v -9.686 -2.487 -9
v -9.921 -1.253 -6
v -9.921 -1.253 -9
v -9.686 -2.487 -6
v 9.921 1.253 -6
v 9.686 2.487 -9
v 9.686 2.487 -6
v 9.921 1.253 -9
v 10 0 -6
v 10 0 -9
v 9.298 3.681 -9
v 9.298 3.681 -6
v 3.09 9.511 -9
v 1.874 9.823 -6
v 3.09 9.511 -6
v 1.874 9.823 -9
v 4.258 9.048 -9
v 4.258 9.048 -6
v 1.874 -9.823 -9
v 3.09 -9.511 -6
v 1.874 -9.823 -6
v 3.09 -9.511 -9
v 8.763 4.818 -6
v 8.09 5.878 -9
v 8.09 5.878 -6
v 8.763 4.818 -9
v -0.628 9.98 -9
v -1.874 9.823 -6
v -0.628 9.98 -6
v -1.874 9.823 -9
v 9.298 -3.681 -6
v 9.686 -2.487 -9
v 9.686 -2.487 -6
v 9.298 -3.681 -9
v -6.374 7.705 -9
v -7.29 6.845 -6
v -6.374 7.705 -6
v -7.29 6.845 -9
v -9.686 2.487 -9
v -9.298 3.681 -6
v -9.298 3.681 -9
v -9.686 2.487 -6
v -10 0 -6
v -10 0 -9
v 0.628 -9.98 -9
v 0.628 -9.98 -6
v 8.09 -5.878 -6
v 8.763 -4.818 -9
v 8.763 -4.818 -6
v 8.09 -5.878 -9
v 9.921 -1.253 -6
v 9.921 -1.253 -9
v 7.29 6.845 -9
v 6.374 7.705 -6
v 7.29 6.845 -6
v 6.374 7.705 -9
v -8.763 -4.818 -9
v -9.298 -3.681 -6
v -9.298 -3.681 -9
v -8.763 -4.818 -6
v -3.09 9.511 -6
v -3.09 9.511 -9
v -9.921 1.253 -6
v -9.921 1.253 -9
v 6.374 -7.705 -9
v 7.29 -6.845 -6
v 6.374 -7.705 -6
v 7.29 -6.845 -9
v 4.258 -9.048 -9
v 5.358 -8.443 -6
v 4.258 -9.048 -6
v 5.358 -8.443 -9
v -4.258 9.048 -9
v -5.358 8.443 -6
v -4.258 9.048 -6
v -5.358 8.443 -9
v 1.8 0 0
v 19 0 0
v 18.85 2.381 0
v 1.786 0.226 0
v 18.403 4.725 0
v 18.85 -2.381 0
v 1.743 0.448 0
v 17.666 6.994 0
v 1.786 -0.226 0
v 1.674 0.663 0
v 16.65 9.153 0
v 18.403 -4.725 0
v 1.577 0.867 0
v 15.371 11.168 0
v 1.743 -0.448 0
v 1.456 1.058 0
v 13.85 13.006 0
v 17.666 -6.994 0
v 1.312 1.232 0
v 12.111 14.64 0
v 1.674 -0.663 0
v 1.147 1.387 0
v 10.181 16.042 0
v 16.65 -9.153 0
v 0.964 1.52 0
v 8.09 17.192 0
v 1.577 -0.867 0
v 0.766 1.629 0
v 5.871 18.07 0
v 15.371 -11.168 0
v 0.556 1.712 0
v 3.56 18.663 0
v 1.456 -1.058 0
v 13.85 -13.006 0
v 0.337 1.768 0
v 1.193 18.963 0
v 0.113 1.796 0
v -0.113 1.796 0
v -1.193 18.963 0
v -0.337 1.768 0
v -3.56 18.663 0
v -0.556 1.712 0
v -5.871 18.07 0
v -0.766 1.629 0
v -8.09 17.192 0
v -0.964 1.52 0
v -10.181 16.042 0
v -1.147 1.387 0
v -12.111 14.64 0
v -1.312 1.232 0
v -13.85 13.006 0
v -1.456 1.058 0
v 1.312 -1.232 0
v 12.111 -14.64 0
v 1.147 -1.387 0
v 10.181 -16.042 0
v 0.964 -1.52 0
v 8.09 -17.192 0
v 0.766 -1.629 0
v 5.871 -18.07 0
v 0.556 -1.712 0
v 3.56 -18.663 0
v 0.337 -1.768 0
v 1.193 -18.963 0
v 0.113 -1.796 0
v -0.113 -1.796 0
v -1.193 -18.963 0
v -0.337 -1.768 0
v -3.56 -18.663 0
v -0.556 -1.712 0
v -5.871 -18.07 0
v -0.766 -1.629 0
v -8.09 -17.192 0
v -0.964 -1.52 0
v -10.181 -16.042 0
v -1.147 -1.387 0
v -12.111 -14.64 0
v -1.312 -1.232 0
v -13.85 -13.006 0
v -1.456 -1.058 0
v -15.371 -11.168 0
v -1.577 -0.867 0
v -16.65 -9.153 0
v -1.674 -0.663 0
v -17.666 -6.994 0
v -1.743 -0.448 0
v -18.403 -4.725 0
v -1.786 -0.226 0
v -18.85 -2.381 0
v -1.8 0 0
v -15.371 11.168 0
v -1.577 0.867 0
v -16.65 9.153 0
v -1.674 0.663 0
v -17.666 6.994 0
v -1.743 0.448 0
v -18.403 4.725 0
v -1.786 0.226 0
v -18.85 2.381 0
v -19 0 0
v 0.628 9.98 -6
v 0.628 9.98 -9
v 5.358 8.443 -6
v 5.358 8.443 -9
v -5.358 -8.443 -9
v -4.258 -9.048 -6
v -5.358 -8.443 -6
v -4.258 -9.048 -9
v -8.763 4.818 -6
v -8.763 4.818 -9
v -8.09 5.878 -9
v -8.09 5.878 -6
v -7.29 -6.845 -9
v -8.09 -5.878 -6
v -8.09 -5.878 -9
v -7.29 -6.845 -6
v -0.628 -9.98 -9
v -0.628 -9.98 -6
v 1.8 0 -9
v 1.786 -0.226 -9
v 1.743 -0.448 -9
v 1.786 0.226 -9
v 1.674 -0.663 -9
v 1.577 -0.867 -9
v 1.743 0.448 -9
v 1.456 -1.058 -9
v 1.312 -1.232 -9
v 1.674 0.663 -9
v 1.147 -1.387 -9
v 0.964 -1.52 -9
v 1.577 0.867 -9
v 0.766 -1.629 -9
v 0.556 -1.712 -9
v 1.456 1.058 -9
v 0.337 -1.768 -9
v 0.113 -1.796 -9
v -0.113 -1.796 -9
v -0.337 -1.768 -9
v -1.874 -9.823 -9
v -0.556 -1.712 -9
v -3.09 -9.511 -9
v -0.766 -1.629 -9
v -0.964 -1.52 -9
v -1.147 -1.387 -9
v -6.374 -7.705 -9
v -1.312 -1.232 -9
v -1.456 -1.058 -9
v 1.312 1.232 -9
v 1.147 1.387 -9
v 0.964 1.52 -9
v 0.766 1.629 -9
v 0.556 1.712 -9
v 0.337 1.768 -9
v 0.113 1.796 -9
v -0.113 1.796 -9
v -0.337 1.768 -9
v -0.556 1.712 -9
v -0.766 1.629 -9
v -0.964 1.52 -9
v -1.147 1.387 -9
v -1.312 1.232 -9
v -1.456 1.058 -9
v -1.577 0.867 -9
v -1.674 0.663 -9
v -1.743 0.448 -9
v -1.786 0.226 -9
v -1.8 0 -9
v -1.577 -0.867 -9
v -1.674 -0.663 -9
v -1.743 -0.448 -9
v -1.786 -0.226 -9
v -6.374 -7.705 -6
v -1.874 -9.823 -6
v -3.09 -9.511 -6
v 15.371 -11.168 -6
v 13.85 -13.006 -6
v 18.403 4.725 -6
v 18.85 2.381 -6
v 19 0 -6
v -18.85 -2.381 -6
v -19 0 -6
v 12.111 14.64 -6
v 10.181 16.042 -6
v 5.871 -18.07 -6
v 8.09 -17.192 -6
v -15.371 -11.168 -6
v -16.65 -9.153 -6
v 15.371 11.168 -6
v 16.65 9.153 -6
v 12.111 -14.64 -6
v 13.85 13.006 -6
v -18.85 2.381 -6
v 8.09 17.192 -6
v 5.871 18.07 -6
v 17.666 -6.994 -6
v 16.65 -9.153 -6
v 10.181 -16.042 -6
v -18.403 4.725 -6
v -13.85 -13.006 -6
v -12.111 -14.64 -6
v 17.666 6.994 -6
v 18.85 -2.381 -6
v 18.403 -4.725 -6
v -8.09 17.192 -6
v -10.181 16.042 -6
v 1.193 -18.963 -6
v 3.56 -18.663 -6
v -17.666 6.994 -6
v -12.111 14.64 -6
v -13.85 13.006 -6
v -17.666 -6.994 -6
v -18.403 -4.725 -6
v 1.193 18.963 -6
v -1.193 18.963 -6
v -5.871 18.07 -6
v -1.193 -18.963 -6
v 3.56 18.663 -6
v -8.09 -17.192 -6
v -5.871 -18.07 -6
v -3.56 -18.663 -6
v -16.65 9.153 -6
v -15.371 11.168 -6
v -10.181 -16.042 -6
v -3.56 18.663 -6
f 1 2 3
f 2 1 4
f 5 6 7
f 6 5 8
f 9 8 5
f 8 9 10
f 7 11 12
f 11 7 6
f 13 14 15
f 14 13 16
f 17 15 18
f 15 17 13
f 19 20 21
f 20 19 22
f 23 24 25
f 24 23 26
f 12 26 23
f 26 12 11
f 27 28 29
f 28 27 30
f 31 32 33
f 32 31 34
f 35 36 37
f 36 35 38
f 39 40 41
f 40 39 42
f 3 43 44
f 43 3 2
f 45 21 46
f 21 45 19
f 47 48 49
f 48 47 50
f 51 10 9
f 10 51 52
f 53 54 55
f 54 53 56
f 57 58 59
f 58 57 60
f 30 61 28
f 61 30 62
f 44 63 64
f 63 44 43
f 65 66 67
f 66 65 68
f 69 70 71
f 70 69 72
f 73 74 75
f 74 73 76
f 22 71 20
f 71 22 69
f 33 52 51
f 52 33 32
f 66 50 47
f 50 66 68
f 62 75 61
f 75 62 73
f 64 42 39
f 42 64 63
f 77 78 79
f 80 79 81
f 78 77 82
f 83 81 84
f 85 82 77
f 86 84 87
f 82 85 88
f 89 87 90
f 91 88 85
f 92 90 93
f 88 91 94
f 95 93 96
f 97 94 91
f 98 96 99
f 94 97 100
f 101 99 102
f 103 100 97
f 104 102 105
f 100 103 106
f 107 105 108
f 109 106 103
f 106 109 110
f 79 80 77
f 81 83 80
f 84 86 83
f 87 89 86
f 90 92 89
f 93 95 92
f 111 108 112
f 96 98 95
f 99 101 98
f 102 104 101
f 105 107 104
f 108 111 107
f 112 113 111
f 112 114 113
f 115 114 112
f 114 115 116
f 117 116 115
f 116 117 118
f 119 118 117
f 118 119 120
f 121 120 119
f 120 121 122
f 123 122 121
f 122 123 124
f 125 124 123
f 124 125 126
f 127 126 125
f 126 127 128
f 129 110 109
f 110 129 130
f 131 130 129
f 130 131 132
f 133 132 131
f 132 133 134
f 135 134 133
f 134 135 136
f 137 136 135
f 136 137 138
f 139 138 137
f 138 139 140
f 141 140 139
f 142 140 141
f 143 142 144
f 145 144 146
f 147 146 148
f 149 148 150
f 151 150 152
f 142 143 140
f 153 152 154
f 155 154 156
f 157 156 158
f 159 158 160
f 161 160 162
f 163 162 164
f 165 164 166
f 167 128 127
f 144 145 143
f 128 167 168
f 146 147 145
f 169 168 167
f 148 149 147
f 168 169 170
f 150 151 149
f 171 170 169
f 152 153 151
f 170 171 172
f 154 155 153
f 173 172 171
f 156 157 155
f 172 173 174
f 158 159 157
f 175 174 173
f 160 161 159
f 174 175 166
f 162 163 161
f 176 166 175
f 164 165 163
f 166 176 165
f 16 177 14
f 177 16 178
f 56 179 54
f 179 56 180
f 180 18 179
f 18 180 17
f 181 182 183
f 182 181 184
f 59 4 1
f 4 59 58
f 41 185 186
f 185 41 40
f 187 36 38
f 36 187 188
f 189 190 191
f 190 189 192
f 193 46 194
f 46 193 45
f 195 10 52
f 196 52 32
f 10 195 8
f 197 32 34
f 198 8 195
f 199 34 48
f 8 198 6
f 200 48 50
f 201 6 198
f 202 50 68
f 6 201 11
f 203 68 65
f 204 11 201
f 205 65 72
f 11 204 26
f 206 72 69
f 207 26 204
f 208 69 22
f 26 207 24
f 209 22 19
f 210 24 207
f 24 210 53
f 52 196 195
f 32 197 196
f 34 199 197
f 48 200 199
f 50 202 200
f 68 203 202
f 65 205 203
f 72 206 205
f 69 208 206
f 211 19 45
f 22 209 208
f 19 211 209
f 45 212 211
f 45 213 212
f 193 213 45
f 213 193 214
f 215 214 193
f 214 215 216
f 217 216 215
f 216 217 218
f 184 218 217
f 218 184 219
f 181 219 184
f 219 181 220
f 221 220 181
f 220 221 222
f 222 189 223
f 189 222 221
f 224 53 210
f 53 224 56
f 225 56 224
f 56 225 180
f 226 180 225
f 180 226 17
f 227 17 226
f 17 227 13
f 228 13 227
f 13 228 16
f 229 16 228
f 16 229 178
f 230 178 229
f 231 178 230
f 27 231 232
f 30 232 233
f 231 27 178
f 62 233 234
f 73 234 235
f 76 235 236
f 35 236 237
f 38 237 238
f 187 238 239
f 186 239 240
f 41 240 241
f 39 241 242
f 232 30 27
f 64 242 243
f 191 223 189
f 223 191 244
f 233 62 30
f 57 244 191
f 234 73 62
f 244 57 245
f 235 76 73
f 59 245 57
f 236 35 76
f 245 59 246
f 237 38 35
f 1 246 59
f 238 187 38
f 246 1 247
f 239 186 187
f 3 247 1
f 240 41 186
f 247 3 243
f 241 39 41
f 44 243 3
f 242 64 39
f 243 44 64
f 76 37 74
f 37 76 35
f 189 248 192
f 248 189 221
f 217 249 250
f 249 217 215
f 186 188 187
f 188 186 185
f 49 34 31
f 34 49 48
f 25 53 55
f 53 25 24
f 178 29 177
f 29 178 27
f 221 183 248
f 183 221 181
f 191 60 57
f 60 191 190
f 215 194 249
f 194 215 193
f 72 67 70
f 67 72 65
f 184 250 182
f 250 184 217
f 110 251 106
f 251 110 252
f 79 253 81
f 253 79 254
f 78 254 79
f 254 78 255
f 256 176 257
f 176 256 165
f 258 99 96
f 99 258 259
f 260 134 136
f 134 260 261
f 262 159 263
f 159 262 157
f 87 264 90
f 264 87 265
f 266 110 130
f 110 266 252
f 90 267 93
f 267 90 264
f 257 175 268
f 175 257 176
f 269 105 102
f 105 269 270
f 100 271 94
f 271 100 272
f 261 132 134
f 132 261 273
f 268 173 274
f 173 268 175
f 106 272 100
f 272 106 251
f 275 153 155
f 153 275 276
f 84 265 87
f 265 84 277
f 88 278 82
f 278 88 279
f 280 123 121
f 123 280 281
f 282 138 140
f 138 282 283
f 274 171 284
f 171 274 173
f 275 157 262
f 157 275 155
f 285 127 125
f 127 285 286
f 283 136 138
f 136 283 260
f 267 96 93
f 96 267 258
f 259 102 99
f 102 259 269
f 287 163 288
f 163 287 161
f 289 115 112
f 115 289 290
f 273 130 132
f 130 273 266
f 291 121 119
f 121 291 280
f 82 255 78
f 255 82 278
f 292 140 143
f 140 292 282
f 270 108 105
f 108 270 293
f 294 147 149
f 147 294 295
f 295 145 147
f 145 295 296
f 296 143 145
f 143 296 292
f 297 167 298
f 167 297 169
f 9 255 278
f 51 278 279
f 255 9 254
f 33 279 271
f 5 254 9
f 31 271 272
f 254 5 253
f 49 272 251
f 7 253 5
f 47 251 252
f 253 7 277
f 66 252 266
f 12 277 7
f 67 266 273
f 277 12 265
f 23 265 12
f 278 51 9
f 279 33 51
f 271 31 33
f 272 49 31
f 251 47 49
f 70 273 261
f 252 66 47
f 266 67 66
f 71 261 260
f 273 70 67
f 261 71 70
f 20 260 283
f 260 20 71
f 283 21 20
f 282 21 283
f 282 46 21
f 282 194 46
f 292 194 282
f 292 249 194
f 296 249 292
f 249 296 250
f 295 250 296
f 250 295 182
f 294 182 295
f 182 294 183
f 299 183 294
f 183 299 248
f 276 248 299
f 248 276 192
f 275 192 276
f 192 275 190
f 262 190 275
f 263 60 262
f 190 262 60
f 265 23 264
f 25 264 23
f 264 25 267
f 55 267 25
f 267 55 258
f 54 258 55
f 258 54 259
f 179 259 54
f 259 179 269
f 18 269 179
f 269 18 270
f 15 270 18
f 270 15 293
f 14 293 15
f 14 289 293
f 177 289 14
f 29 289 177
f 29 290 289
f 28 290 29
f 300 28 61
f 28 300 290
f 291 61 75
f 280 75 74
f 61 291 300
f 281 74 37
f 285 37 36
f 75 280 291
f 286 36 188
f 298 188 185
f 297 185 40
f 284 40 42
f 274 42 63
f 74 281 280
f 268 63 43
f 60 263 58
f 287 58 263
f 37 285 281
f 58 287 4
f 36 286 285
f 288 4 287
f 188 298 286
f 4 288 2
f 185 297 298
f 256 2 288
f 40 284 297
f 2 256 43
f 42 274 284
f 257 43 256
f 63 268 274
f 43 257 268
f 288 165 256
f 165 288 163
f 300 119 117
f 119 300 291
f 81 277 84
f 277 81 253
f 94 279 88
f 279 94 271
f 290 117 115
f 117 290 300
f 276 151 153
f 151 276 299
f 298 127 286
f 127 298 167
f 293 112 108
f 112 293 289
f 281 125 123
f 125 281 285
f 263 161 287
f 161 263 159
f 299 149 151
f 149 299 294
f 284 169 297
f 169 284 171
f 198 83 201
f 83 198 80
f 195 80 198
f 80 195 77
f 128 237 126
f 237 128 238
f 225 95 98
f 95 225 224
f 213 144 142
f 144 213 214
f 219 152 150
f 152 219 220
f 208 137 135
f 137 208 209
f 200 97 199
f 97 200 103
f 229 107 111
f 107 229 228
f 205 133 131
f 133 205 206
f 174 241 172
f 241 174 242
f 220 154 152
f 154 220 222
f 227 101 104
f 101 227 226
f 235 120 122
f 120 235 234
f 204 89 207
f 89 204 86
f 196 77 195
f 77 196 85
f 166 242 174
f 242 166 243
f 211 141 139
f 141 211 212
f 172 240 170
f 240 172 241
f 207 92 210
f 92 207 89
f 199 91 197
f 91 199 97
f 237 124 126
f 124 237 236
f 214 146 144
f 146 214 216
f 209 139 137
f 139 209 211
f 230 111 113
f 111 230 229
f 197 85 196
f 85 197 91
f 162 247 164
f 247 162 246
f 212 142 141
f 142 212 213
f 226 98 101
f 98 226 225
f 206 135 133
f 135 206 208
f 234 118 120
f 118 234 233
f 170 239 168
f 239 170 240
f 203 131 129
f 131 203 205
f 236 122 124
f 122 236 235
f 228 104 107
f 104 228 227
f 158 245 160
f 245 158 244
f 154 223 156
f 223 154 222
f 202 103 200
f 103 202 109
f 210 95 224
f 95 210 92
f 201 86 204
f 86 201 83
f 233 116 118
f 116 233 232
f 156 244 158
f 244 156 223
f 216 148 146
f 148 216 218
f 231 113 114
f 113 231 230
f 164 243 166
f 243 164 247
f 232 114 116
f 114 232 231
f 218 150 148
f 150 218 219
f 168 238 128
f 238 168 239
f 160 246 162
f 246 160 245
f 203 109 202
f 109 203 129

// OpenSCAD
$fn = 50;


difference() {
	union() {
		translate(v = [0, 0, -9.0000000000]) {
			cylinder(h = 9, r = 10.0000000000);
		}
		translate(v = [0, 0, -6.0000000000]) {
			cylinder(h = 6, r = 19.0000000000);
		}
	}
	union() {
		#translate(v = [0, 0, -9]) {
			cylinder(h = 9, r = 1.8000000000);
		}
	}
}
